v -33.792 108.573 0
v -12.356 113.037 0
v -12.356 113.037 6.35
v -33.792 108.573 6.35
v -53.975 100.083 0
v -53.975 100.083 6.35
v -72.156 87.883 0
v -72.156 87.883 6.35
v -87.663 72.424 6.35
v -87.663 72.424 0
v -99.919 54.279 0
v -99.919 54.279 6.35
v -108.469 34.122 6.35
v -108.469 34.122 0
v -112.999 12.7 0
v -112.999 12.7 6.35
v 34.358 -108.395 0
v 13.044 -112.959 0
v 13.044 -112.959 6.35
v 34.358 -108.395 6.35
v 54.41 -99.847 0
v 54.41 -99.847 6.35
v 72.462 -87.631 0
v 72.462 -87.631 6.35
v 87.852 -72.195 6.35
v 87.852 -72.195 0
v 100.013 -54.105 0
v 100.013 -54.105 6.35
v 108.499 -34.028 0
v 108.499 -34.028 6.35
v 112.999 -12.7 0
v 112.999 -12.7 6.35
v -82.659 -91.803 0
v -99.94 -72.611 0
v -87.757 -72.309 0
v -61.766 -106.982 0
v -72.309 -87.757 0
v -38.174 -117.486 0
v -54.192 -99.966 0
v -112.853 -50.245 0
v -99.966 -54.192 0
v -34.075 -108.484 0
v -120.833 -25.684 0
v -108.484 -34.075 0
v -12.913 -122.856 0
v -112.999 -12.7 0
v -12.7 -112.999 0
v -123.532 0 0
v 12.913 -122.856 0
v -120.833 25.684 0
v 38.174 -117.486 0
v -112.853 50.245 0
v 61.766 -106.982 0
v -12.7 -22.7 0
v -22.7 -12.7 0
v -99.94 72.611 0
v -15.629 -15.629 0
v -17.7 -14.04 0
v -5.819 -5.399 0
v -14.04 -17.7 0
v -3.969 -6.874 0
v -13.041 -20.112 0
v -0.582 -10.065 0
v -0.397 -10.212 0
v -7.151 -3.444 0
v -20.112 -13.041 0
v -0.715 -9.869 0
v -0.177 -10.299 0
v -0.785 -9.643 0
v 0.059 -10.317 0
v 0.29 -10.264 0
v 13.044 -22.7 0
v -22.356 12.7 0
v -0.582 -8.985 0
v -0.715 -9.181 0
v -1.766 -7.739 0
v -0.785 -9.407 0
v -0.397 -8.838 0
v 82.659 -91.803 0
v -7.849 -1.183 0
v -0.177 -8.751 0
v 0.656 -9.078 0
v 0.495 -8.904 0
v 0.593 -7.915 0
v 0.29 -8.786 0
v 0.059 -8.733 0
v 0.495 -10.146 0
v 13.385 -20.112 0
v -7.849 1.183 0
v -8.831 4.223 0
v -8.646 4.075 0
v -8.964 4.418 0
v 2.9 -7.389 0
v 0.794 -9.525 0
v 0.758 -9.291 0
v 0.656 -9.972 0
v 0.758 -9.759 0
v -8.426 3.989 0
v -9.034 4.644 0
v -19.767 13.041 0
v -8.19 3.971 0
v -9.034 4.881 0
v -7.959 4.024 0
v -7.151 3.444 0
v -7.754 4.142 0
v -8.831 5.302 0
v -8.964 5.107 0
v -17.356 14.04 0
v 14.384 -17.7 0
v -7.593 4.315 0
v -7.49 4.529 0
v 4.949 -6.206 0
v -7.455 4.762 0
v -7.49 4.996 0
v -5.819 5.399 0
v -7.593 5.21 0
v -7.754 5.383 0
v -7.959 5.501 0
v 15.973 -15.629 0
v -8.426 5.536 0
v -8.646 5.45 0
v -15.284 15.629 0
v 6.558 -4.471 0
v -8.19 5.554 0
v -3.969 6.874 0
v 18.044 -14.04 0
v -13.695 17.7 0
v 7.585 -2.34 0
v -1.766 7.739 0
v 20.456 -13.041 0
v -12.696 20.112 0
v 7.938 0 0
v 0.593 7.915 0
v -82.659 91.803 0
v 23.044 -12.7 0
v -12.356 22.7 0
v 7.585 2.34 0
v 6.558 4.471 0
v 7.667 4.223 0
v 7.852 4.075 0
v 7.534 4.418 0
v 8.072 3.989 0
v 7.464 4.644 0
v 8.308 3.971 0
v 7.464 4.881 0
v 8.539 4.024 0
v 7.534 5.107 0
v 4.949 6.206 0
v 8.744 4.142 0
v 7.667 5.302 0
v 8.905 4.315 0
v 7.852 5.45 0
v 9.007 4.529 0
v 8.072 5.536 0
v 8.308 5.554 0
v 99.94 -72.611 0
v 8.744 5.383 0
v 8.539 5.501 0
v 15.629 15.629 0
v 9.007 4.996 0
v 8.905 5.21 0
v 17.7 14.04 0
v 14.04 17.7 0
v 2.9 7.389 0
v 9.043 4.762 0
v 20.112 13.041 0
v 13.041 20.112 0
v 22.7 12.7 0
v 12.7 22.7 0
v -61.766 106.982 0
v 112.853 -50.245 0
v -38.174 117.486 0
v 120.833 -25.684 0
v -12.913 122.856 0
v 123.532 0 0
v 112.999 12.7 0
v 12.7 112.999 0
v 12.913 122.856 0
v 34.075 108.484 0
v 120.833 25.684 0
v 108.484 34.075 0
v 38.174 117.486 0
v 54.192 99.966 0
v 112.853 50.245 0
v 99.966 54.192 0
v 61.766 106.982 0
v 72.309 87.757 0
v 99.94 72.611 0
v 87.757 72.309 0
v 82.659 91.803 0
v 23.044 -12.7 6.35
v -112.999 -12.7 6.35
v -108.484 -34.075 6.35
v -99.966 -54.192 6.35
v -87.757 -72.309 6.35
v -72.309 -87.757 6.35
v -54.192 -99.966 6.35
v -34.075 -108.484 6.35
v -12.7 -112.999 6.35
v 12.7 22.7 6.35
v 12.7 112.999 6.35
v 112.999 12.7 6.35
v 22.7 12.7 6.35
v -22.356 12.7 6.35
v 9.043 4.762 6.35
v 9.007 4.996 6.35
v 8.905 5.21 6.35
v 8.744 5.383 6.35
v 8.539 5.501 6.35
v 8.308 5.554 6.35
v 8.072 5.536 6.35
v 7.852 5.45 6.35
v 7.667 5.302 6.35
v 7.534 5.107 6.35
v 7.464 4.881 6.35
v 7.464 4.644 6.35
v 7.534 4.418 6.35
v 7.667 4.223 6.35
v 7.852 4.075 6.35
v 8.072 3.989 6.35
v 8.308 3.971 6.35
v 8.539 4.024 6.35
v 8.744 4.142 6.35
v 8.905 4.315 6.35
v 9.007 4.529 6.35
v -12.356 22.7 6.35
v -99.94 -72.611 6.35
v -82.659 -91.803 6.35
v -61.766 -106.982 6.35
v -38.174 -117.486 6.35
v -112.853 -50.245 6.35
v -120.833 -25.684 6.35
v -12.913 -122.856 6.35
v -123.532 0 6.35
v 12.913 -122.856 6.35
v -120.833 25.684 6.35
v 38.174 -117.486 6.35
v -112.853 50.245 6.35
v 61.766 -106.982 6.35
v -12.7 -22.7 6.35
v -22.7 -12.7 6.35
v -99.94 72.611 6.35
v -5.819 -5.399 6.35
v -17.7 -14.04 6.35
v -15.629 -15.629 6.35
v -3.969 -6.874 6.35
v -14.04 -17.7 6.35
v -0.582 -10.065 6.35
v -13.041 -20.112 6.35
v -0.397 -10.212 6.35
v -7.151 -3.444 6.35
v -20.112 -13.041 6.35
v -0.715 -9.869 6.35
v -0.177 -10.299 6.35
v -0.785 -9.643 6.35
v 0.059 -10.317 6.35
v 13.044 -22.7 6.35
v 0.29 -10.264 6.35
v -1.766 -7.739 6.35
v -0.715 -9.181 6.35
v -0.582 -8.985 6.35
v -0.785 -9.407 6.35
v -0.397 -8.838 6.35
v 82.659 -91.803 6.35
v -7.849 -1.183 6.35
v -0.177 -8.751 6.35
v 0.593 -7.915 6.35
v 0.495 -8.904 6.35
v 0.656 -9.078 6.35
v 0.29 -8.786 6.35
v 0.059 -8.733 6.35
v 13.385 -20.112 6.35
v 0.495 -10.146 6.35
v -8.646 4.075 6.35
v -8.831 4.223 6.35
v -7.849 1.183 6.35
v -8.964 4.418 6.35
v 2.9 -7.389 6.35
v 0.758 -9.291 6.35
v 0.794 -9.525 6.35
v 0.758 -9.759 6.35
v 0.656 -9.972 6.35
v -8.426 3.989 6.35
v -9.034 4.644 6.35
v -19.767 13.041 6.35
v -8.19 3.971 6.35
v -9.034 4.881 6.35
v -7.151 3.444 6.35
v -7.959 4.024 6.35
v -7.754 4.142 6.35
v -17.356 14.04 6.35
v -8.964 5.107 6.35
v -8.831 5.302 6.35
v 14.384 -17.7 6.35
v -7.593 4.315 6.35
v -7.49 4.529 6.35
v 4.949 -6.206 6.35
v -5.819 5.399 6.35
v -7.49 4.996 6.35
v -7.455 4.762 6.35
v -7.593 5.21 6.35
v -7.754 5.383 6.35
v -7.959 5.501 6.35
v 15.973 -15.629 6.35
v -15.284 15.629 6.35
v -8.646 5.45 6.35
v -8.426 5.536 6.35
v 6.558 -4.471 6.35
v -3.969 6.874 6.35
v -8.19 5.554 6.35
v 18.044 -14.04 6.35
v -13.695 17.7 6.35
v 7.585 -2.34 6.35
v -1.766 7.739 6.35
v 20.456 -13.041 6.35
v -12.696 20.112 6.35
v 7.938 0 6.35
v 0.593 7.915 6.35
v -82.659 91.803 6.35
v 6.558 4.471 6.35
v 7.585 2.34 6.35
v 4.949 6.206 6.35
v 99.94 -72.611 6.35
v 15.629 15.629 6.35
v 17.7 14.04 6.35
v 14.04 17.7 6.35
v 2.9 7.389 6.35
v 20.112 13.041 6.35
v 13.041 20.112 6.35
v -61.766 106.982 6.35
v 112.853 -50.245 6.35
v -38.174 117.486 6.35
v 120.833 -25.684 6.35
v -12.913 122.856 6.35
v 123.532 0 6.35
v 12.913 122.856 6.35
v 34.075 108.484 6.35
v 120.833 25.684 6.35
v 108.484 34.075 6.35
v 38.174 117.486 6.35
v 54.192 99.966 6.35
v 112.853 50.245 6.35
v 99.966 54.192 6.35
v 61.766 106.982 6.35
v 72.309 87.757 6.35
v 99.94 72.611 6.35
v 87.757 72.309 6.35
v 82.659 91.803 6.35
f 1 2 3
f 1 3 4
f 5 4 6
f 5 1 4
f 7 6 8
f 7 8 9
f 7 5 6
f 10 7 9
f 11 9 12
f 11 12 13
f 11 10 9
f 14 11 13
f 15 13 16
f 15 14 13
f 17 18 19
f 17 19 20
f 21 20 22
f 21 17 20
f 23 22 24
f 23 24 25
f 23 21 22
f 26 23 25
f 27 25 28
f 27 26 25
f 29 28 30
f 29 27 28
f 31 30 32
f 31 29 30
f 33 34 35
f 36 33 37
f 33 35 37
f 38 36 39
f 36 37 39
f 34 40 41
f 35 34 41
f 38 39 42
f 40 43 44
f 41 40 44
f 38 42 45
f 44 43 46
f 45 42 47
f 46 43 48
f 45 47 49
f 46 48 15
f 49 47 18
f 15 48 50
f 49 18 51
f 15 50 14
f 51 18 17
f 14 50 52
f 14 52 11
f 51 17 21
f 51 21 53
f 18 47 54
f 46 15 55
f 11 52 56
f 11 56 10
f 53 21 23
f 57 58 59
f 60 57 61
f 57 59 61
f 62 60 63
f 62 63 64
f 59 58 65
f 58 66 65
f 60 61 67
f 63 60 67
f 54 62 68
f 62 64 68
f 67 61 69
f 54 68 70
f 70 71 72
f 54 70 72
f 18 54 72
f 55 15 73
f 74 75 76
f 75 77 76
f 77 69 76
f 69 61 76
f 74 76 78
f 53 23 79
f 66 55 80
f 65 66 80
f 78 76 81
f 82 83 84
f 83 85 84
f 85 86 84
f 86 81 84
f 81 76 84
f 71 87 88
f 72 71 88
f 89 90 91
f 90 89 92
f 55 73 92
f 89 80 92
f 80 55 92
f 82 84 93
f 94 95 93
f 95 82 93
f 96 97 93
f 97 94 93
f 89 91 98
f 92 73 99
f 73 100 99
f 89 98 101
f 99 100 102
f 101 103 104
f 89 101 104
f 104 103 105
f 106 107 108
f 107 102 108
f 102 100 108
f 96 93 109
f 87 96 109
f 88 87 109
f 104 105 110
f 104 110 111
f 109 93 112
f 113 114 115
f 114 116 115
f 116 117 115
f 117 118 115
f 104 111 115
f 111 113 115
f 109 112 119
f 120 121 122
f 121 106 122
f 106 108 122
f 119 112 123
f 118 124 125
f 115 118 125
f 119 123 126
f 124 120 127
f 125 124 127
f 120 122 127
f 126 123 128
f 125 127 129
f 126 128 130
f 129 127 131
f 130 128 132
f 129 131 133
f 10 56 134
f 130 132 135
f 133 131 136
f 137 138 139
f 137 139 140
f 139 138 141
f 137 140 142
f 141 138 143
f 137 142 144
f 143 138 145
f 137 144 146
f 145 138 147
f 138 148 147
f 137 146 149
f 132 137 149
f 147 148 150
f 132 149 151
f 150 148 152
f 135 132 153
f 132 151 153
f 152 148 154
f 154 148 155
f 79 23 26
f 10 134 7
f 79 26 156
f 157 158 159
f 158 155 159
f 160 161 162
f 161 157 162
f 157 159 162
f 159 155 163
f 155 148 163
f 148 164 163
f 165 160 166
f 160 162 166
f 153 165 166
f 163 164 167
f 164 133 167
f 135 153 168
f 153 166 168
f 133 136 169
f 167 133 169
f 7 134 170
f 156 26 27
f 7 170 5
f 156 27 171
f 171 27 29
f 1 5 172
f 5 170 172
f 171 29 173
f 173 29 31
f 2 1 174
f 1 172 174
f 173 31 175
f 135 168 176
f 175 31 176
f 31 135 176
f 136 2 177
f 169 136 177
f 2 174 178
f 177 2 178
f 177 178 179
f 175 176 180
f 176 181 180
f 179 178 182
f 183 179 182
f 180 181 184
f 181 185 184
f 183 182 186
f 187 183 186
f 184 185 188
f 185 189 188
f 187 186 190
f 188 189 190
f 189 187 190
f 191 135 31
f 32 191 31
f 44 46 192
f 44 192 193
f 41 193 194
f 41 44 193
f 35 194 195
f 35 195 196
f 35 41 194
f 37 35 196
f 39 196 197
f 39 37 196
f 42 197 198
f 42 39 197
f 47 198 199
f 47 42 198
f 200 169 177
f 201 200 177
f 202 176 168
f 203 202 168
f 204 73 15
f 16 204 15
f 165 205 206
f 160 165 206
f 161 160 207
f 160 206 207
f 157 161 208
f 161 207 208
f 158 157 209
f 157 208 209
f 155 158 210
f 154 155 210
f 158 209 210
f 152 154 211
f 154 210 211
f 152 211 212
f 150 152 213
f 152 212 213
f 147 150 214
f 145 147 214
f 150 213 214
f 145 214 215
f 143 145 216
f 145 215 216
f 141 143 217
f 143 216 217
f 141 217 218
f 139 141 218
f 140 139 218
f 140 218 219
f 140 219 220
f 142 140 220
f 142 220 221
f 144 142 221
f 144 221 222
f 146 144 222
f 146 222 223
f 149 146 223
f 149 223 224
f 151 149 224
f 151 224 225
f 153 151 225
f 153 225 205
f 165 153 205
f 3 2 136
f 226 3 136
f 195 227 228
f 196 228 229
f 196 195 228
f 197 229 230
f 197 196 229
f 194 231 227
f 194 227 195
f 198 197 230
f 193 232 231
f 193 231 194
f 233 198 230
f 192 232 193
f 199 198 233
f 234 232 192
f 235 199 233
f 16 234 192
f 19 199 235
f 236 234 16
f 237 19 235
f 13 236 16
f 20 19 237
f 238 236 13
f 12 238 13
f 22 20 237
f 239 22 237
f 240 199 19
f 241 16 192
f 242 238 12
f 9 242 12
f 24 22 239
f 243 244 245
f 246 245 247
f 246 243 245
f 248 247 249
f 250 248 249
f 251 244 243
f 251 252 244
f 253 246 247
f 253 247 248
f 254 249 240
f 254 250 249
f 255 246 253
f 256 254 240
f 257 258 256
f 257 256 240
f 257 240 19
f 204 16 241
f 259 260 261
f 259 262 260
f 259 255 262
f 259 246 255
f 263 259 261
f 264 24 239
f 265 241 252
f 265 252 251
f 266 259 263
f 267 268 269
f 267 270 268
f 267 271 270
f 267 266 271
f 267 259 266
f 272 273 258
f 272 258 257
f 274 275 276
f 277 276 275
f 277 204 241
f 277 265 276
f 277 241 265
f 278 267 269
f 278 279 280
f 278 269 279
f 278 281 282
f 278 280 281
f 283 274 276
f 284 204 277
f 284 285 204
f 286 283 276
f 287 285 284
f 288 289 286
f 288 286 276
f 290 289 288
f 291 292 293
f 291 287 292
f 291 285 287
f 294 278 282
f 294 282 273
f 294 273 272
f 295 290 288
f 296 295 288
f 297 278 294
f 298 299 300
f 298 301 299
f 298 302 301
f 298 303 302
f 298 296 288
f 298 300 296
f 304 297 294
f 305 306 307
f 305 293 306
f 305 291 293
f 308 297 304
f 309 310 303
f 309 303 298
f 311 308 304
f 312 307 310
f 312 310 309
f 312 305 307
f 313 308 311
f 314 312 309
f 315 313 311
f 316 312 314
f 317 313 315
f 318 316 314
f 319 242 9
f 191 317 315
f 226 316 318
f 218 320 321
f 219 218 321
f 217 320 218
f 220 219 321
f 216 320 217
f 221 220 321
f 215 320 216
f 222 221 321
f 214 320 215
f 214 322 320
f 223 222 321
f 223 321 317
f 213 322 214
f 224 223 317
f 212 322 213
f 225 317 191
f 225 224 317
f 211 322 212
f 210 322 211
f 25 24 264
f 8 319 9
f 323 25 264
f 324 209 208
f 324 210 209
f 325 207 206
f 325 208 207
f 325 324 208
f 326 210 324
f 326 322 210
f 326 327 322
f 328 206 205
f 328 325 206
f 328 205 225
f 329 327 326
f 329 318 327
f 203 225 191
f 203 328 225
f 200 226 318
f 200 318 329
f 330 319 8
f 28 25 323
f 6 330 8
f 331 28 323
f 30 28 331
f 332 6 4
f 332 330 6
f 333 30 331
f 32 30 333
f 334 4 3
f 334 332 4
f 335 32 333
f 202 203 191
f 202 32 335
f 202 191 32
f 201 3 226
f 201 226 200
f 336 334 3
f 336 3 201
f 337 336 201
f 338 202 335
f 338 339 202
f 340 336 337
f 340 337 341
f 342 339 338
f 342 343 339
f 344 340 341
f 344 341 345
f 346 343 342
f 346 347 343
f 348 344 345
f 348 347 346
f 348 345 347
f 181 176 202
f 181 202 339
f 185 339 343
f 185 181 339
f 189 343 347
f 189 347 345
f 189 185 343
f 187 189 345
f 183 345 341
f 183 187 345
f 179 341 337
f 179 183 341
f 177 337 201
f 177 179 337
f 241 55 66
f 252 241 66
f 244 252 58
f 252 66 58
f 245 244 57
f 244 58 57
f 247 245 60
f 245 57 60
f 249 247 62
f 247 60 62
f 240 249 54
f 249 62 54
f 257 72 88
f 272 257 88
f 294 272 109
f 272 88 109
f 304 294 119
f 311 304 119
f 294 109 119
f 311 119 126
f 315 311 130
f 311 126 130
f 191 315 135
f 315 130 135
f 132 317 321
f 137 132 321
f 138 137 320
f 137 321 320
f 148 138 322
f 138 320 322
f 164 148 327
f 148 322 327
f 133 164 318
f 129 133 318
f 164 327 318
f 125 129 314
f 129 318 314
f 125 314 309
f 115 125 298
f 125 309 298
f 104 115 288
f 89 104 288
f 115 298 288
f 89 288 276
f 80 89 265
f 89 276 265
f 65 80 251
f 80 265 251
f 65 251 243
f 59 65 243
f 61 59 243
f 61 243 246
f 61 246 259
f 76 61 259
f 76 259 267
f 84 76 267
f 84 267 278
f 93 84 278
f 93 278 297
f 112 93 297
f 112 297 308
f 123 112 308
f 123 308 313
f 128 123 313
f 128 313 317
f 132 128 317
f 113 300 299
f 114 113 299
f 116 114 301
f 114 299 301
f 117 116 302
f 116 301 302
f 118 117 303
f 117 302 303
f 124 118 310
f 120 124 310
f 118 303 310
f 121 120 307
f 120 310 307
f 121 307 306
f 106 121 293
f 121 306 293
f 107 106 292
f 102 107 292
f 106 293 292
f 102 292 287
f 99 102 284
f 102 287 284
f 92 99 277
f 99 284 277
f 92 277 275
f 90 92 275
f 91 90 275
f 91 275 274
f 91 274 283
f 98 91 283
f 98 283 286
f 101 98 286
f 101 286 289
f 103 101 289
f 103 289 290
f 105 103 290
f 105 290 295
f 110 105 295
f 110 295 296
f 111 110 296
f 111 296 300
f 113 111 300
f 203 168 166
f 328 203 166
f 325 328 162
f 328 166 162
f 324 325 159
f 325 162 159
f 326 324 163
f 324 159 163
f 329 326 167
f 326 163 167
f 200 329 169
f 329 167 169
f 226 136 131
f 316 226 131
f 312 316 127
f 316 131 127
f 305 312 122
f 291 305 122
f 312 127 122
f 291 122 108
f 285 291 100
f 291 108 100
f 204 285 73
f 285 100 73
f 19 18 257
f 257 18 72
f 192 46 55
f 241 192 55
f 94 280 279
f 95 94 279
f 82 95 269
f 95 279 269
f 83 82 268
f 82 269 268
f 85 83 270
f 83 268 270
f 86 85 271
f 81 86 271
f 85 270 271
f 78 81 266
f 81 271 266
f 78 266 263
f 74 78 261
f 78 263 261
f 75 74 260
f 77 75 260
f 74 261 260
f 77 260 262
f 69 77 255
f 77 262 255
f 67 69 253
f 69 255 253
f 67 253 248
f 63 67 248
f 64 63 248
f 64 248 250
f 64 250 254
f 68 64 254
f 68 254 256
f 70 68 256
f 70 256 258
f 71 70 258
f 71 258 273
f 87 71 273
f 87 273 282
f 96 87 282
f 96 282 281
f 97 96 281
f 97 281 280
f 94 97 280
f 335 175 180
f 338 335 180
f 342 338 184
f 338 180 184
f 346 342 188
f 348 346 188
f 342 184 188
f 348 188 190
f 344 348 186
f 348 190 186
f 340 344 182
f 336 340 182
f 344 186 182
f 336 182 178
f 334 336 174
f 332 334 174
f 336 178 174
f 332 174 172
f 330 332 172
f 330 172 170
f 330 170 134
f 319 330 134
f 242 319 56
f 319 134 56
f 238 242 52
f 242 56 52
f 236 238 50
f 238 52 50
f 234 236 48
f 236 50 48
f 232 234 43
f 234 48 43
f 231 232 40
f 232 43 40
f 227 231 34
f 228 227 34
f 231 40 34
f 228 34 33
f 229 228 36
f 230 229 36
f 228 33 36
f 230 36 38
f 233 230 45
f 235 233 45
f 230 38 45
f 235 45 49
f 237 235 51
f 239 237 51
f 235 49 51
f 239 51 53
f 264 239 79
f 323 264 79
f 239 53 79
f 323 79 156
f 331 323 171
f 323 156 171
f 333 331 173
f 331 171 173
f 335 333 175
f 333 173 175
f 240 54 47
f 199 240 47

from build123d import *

# Parameters (mm, degrees)
SKETCH1_R           = 123.5325
SKETCH1_R_2         = 113.71
BOSS_EXTRUDE1_DEPTH = 6.35
CUT_EXTRUDE1_REACH  = 176.817
SKETCH2_R           = 7.937515
CUT_EXTRUDE2_REACH  = 176.817
SKETCH3_R           = 0.79375


with BuildPart() as part:
    # Sketch1 → Boss-Extrude1 (new body)
    # profile 1 of 2: a face of its own
    with BuildSketch(Plane.XY):
        Circle(SKETCH1_R)
        Circle(SKETCH1_R_2, mode=Mode.SUBTRACT)
    # profile 2 of 2: a face of its own
    with BuildSketch(Plane.XY):
        with BuildLine():
            ThreePointArc((22.7, 12.7), (15.628932188, 15.628932188), (12.7, 22.7))
            Line((12.7, 22.7), (12.7, 112.998557955))
            ThreePointArc((12.7, 112.998557955), (0.173278497, 113.709867974), (-12.355552704, 113.036739237))
            Line((-12.355552704, 113.036739237), (-12.355552704, 22.7))
            ThreePointArc((-12.355552704, 22.7), (-15.284484892, 15.628932188), (-22.355552704, 12.7))
            Line((-22.355552704, 12.7), (-112.998557955, 12.7))
            ThreePointArc((-112.998557955, 12.7), (-113.71, 0), (-112.998557955, -12.7))
            Line((-112.998557955, -12.7), (-22.7, -12.7))
            ThreePointArc((-22.7, -12.7), (-15.628932188, -15.628932188), (-12.7, -22.7))
            Line((-12.7, -22.7), (-12.7, -112.998557955))
            ThreePointArc((-12.7, -112.998557955), (0.173337872, -113.709867883), (13.044447296, -112.959313448))
            Line((13.044447296, -112.959313448), (13.044447296, -22.7))
            ThreePointArc((13.044447296, -22.7), (15.973379485, -15.628932188), (23.044447296, -12.7))
            Line((23.044447296, -12.7), (112.998557955, -12.7))
            ThreePointArc((112.998557955, -12.7), (113.53200017, -6.359955774), (113.71, 0))
            ThreePointArc((113.71, 0), (113.53200017, 6.359955774), (112.998557955, 12.7))
            Line((112.998557955, 12.7), (22.7, 12.7))
        make_face()
    extrude(amount=BOSS_EXTRUDE1_DEPTH)

    # Sketch2 → Cut-Extrude1 (cut, up to next)
    with BuildSketch(Plane.XY.offset(6.35), mode=Mode.PRIVATE) as cut_extrude1_sk1:
        Circle(SKETCH2_R)
    cut_extrude1_tool1 = extrude(cut_extrude1_sk1.sketch, amount=-CUT_EXTRUDE1_REACH, mode=Mode.PRIVATE) & part.part
    add(cut_extrude1_tool1.solids().sort_by_distance((0, 0, 6.35))[0], mode=Mode.SUBTRACT)

    # Sketch3 → Cut-Extrude2 (cut, up to next)
    with BuildSketch(Plane.XY.offset(6.35), mode=Mode.PRIVATE) as cut_extrude2_sk1:
        with Locations((0, -9.525)):
            Circle(SKETCH3_R)
    cut_extrude2_tool1 = extrude(cut_extrude2_sk1.sketch, amount=-CUT_EXTRUDE2_REACH, mode=Mode.PRIVATE) & part.part
    # Sketch3 → Cut-Extrude2 (cut, up to next)
    with BuildSketch(Plane.XY.offset(6.35), mode=Mode.PRIVATE) as cut_extrude2_sk2:
        with Locations((8.248891971, 4.7625)):
            Circle(SKETCH3_R)
    cut_extrude2_tool2 = extrude(cut_extrude2_sk2.sketch, amount=-CUT_EXTRUDE2_REACH, mode=Mode.PRIVATE) & part.part
    # Sketch3 → Cut-Extrude2 (cut, up to next)
    with BuildSketch(Plane.XY.offset(6.35), mode=Mode.PRIVATE) as cut_extrude2_sk3:
        with Locations((-8.248891971, 4.7625)):
            Circle(SKETCH3_R)
    cut_extrude2_tool3 = extrude(cut_extrude2_sk3.sketch, amount=-CUT_EXTRUDE2_REACH, mode=Mode.PRIVATE) & part.part
    add(cut_extrude2_tool1.solids().sort_by_distance((0, -9.525, 6.35))[0], mode=Mode.SUBTRACT)
    add(cut_extrude2_tool2.solids().sort_by_distance((8.248892, 4.7625, 6.35))[0], mode=Mode.SUBTRACT)
    add(cut_extrude2_tool3.solids().sort_by_distance((-8.248892, 4.7625, 6.35))[0], mode=Mode.SUBTRACT)


solid = part.part
